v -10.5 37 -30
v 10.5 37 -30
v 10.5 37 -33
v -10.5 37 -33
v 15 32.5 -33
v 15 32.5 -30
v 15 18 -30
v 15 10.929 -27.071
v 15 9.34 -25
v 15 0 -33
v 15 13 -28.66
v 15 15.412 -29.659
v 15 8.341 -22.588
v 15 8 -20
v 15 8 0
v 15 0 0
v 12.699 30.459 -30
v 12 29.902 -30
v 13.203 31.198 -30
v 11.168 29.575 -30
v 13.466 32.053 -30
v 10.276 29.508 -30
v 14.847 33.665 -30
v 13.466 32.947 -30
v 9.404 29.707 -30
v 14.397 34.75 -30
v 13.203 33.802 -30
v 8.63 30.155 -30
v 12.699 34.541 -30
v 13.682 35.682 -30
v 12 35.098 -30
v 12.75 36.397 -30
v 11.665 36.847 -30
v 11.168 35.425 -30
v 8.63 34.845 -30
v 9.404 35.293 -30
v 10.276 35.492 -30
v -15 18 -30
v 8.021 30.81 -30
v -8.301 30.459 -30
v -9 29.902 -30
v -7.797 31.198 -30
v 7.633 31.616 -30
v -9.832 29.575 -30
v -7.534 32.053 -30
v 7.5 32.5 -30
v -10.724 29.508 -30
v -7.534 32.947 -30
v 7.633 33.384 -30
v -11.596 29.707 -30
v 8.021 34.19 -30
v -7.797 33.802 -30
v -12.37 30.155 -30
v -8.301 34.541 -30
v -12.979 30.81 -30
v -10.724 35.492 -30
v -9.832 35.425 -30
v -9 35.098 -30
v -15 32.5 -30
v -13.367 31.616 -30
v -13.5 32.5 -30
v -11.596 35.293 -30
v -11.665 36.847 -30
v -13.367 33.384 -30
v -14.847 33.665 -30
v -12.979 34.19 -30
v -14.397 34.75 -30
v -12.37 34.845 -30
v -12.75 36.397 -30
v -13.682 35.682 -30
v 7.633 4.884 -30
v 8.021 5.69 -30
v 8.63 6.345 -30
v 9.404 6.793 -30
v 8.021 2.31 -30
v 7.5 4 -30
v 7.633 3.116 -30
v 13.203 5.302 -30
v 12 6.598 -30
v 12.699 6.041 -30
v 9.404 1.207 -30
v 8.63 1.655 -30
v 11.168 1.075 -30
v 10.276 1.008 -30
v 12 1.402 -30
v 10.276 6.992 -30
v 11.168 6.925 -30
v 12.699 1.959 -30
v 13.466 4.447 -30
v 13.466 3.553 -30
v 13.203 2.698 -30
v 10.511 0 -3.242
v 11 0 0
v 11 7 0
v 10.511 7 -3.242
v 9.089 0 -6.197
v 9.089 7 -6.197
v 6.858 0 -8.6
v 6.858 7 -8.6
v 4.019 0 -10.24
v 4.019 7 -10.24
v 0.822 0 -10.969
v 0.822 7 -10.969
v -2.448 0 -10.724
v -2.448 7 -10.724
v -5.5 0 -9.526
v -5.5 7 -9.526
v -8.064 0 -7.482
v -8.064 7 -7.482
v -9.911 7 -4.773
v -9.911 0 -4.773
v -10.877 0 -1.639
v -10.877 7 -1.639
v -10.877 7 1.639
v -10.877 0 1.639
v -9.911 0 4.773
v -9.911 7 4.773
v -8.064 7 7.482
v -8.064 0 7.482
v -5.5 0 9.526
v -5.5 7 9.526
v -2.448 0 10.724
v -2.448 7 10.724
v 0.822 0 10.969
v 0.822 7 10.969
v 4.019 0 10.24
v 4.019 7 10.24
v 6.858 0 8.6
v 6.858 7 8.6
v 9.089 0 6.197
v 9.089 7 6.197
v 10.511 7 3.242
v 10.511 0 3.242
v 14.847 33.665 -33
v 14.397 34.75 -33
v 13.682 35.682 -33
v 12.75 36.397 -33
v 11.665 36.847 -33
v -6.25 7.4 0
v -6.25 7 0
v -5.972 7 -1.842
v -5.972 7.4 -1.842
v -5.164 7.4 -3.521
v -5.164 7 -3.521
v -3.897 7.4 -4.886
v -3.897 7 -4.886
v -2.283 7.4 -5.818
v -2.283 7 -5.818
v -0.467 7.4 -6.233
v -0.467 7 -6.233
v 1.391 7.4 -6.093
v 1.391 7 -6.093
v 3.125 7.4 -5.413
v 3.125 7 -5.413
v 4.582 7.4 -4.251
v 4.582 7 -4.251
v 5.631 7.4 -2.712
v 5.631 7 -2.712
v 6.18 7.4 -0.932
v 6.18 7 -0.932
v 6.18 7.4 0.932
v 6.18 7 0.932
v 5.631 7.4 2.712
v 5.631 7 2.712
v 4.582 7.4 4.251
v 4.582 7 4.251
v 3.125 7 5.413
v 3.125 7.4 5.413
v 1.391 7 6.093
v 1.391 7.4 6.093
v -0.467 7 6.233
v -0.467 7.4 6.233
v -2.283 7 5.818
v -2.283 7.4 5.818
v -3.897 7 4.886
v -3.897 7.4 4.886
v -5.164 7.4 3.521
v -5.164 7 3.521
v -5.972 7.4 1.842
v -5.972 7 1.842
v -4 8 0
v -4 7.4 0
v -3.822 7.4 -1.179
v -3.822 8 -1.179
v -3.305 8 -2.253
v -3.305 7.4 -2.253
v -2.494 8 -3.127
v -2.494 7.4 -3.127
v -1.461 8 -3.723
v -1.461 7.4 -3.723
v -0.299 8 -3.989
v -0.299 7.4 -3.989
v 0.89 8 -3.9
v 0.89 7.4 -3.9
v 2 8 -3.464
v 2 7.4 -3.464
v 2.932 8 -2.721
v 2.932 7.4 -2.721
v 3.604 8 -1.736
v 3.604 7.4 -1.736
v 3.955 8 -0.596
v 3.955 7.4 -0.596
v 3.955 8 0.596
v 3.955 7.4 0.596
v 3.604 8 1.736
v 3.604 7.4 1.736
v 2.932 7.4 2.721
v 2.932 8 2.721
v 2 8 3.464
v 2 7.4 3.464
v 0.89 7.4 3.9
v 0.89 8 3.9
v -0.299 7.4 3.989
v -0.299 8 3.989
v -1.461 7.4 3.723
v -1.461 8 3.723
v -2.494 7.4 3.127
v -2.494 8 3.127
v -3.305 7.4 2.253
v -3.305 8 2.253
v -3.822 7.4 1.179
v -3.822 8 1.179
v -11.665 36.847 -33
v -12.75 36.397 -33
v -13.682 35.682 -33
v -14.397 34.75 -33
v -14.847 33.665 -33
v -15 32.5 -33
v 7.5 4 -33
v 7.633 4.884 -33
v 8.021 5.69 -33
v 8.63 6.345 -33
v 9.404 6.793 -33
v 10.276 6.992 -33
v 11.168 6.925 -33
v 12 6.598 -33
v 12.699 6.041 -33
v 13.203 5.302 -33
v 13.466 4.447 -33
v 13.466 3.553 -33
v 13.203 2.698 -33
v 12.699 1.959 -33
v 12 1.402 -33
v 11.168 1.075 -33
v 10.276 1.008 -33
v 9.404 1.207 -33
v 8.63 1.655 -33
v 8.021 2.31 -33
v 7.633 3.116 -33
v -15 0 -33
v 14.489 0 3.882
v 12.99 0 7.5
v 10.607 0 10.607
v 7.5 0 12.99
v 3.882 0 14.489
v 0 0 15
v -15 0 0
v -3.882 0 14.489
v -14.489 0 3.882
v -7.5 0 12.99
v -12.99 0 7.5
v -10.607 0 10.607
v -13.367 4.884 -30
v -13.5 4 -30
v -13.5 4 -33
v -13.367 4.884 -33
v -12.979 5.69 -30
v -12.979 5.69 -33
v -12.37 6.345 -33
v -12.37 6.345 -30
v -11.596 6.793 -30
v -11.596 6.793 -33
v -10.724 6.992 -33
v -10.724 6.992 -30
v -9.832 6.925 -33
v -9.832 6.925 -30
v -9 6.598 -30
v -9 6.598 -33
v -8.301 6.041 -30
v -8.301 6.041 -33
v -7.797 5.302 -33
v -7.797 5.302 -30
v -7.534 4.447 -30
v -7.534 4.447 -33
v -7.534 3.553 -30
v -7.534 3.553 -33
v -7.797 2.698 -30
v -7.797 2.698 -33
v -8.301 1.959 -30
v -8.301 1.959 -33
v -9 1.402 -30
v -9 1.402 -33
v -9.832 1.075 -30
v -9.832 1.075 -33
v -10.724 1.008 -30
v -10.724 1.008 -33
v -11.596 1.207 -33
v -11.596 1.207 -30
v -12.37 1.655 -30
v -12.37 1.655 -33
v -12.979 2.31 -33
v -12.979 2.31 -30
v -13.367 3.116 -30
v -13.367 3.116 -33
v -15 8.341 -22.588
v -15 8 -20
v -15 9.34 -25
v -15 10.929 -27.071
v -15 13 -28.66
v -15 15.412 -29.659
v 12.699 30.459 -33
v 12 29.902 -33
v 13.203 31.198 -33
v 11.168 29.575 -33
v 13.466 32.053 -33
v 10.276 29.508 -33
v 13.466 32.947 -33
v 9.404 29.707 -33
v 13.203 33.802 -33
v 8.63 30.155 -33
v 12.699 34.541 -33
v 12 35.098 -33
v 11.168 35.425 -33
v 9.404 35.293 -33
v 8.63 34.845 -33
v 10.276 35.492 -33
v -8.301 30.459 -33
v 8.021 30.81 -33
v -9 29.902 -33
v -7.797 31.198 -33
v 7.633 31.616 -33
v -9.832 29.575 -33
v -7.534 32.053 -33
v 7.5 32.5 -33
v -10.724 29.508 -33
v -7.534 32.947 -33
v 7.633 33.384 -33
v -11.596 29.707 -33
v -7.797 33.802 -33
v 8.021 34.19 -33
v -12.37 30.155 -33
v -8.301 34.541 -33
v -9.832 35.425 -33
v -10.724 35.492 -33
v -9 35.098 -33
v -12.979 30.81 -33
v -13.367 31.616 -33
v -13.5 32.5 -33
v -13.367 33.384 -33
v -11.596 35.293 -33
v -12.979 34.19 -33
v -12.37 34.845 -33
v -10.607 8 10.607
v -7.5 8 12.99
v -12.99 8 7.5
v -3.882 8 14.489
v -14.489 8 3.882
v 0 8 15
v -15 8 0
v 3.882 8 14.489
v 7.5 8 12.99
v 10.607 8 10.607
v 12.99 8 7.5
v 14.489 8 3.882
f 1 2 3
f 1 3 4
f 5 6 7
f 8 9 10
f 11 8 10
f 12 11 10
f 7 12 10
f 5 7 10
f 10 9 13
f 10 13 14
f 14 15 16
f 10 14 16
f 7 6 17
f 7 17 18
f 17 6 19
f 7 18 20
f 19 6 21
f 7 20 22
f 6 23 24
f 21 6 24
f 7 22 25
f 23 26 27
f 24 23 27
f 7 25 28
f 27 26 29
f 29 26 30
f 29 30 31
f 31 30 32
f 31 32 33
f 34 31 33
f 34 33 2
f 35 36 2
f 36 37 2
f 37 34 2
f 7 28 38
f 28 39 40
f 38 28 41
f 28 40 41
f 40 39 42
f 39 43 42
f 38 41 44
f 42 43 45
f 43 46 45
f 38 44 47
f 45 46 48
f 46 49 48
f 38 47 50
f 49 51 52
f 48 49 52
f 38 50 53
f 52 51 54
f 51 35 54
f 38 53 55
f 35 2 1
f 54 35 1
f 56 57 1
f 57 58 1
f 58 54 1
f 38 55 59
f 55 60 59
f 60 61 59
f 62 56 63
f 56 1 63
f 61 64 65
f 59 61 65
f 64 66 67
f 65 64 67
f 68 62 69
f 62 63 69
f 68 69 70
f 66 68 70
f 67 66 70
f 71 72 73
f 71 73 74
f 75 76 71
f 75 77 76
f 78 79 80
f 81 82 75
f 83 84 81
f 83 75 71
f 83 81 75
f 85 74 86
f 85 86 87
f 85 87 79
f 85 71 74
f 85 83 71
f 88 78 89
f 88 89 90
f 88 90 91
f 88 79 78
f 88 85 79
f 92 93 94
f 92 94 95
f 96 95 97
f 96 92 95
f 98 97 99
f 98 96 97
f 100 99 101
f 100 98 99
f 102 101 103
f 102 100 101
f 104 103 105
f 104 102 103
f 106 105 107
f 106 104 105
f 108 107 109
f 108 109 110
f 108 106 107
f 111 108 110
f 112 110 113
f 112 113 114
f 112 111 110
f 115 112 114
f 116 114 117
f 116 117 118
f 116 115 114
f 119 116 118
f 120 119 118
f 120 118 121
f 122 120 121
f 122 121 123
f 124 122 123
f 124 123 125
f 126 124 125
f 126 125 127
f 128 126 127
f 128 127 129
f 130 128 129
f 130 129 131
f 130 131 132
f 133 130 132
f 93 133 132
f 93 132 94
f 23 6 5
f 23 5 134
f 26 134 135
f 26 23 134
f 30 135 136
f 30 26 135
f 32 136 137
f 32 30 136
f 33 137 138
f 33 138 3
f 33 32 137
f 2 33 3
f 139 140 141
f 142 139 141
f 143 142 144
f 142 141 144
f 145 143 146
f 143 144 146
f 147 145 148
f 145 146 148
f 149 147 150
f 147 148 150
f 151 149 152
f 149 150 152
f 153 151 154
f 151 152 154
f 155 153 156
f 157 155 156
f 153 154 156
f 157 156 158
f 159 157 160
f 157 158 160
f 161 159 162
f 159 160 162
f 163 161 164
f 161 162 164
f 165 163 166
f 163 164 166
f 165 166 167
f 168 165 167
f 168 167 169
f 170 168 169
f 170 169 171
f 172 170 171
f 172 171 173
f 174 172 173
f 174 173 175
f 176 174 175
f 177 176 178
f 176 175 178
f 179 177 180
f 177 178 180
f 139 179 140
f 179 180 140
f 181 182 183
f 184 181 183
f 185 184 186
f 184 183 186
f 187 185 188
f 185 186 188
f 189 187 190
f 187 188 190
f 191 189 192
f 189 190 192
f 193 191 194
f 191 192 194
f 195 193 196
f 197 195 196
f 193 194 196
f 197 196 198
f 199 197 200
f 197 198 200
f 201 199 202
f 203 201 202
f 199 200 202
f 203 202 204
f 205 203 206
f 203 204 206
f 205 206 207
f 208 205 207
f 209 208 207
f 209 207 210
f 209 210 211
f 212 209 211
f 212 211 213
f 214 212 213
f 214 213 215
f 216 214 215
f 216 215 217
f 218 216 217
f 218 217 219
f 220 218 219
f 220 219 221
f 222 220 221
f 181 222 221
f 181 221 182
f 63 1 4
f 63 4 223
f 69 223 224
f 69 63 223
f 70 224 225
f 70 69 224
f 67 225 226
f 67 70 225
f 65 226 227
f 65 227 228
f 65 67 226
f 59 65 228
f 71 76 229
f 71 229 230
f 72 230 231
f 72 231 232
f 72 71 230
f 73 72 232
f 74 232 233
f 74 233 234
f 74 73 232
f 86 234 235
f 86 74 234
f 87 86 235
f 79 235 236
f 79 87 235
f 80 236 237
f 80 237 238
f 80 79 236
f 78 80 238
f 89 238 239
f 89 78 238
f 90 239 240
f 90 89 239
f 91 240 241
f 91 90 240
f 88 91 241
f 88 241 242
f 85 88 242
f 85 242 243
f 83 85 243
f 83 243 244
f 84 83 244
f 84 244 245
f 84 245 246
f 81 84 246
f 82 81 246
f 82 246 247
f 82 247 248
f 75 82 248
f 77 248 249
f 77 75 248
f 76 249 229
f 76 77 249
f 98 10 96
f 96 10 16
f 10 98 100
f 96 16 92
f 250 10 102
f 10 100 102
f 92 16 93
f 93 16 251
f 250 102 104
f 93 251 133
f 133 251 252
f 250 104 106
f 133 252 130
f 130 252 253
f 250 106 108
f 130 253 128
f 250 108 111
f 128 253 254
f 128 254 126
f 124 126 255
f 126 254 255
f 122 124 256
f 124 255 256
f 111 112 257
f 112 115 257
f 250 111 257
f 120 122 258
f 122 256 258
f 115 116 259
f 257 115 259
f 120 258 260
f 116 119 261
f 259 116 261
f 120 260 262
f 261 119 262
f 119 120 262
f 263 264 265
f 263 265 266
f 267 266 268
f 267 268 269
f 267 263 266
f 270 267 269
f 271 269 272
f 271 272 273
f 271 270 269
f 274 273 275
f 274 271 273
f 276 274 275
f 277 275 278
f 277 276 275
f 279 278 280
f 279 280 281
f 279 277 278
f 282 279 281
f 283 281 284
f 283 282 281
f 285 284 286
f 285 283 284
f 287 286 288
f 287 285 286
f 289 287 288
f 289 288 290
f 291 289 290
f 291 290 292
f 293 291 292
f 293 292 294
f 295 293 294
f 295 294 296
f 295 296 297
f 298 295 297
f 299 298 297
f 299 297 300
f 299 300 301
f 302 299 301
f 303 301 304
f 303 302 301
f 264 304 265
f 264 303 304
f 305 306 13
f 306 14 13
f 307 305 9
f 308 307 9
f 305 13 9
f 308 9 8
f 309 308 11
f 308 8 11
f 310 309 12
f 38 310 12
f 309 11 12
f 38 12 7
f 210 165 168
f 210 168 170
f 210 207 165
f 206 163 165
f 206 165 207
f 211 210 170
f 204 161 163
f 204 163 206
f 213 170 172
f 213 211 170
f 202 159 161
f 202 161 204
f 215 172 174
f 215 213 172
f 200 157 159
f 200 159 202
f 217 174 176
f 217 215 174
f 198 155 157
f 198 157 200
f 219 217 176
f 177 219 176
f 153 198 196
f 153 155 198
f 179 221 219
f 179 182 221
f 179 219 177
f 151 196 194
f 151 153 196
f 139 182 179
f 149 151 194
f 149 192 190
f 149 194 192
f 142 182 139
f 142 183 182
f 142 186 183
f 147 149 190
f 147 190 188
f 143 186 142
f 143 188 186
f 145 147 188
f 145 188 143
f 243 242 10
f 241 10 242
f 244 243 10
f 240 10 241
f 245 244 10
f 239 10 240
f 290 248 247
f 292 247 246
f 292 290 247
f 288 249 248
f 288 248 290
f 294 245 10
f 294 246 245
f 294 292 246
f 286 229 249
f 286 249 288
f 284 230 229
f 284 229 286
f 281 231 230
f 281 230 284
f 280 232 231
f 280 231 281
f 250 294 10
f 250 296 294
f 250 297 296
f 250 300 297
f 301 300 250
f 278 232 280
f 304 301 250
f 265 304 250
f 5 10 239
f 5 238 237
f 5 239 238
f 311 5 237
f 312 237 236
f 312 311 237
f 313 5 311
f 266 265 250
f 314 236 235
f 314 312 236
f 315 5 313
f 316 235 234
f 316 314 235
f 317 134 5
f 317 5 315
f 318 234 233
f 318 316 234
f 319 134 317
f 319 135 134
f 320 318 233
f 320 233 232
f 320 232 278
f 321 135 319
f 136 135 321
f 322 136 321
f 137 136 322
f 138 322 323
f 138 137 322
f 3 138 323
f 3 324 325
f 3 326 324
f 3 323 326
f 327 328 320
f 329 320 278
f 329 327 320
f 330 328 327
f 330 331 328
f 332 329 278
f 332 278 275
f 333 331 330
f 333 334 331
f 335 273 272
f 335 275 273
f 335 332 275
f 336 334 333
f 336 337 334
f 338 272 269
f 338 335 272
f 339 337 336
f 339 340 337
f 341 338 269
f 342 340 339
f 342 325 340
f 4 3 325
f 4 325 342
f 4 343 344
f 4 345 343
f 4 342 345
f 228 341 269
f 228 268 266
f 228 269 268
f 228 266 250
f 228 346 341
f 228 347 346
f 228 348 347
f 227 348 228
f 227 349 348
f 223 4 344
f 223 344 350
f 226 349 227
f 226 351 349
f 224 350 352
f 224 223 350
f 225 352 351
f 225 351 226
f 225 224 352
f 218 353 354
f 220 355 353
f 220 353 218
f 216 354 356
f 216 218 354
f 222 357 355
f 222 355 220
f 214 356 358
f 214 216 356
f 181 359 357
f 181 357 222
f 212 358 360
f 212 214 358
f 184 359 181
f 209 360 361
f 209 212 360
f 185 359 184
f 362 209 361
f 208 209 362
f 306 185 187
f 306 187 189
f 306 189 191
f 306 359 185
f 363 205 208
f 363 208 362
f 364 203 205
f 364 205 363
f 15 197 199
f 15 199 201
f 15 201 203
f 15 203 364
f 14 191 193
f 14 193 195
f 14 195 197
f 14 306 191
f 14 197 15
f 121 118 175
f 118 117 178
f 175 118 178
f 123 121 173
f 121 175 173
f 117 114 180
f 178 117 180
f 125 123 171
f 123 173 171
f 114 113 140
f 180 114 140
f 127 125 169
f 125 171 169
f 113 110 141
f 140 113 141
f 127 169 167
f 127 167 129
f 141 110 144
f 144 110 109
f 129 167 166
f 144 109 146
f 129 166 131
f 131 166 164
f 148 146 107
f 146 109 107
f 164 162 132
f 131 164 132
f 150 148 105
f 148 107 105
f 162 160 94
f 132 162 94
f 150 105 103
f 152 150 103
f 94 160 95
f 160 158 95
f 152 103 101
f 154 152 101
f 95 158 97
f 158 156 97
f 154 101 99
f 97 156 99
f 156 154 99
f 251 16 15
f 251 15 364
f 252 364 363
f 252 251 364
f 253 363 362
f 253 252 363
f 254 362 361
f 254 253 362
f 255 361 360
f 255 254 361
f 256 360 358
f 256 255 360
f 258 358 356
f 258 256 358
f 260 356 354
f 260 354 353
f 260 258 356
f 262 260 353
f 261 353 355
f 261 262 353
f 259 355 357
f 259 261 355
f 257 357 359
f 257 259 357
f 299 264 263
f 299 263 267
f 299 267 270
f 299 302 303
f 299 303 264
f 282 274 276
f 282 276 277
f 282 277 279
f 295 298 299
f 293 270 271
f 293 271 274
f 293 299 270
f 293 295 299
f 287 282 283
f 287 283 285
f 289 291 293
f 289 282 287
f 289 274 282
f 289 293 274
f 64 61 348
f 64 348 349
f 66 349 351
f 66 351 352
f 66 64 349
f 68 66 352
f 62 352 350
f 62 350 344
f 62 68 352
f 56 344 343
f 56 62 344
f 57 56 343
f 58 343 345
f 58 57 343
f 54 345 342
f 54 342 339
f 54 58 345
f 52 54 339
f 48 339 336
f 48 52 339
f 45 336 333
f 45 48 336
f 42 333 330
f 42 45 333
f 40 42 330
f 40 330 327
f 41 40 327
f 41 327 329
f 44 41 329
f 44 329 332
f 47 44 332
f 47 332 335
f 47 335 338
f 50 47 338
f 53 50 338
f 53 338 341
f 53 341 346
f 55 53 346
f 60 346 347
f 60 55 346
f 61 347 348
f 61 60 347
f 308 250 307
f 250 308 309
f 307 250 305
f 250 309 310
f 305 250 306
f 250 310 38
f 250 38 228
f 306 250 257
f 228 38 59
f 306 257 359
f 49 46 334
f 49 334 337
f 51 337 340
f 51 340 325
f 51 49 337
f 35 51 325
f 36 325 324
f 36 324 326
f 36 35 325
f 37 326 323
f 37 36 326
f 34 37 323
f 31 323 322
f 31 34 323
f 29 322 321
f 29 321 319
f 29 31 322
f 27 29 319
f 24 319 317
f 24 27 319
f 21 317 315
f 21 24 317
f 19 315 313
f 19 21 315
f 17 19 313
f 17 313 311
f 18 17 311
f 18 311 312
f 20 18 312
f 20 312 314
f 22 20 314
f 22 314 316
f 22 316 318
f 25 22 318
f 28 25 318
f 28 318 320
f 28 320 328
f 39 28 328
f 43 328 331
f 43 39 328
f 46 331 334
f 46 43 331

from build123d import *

# Parameters (mm, degrees)
SKETCH_1_R          = 11
EXTRUDE_1_DEPTH     = 8
SKETCH_2_W          = 30
SKETCH_2_H          = 8
SKETCH_2_R          = 3
EXTRUDE_2_DEPTH     = 3
FILLET_1_R          = 10
EXTRUDE_START       = 8
SKETCH_1_2_R        = 11
EXTRUDE_3_DEPTH     = 1
SKETCH_3_R          = 4
CUT_EXTRUDE_1_DEPTH = 31
SKETCH_4_R          = 6.25
CUT_EXTRUDE_2_DEPTH = 0.4


with BuildPart() as part:
    # 草圖1 → 填料-伸長1 (new body)
    with BuildSketch(Plane(origin=(0, 0, 0), x_dir=(1, 0, 0), z_dir=(0, 1, 0))):
        with BuildLine():
            Line((-15, 0), (-15, 30))
            Line((-15, 30), (15, 30))
            Line((15, 30), (15, 0))
            ThreePointArc((15, 0), (0, -15), (-15, 0))
        make_face()
        Circle(SKETCH_1_R, mode=Mode.SUBTRACT)
    extrude(amount=EXTRUDE_1_DEPTH)

    # 草圖2 → 填料-伸長2 (add)
    with BuildSketch(Plane(origin=(0, 0, -30), x_dir=(-1, 0, 0), z_dir=(0, 0, -1))):
        with Locations((0, 4)):
            Rectangle(SKETCH_2_W, SKETCH_2_H)
        with Locations((-10.5, 4)):
            Circle(SKETCH_2_R, mode=Mode.SUBTRACT)
        with Locations((10.5, 4)):
            Circle(SKETCH_2_R, mode=Mode.SUBTRACT)
        with BuildLine():
            Line((15, 32.5), (15, 8))
            Line((15, 8), (-15, 8))
            Line((-15, 8), (-15, 32.5))
            ThreePointArc((-15, 32.5), (-13.681980515, 35.681980515), (-10.5, 37))
            Line((-10.5, 37), (10.5, 37))
            ThreePointArc((10.5, 37), (13.681980515, 35.681980515), (15, 32.5))
        make_face()
        with Locations((10.5, 32.5)):
            Circle(SKETCH_2_R, mode=Mode.SUBTRACT)
        with Locations((-10.5, 32.5)):
            Circle(SKETCH_2_R, mode=Mode.SUBTRACT)
    extrude(amount=EXTRUDE_2_DEPTH)

    # 圓角1
    fillet_1_edges = [part.edges().sort_by_distance(p)[0] for p in [
        (0, 8, -30),
    ]]
    fillet(fillet_1_edges, radius=FILLET_1_R)

    # 草圖1<2> → 填料-伸長3 (add)
    with BuildSketch(Plane(origin=(0, 0, 0), x_dir=(1, 0, 0), z_dir=(0, 1, 0)).offset(EXTRUDE_START)):
        Circle(SKETCH_1_2_R)
    extrude(amount=-EXTRUDE_3_DEPTH)

    # 草圖3 → 除料-伸長1 (cut, through all)
    with BuildSketch(Plane(origin=(0, 7, 0), x_dir=(-1, 0, 0), z_dir=(0, -1, 0))):
        Circle(SKETCH_3_R)
    extrude(amount=-CUT_EXTRUDE_1_DEPTH, mode=Mode.SUBTRACT)

    # 草圖4 → 除料-伸長2 (cut)
    with BuildSketch(Plane(origin=(0, 7, 0), x_dir=(-1, 0, 0), z_dir=(0, -1, 0))):
        Circle(SKETCH_4_R)
    extrude(amount=-CUT_EXTRUDE_2_DEPTH, mode=Mode.SUBTRACT)


solid = part.part
